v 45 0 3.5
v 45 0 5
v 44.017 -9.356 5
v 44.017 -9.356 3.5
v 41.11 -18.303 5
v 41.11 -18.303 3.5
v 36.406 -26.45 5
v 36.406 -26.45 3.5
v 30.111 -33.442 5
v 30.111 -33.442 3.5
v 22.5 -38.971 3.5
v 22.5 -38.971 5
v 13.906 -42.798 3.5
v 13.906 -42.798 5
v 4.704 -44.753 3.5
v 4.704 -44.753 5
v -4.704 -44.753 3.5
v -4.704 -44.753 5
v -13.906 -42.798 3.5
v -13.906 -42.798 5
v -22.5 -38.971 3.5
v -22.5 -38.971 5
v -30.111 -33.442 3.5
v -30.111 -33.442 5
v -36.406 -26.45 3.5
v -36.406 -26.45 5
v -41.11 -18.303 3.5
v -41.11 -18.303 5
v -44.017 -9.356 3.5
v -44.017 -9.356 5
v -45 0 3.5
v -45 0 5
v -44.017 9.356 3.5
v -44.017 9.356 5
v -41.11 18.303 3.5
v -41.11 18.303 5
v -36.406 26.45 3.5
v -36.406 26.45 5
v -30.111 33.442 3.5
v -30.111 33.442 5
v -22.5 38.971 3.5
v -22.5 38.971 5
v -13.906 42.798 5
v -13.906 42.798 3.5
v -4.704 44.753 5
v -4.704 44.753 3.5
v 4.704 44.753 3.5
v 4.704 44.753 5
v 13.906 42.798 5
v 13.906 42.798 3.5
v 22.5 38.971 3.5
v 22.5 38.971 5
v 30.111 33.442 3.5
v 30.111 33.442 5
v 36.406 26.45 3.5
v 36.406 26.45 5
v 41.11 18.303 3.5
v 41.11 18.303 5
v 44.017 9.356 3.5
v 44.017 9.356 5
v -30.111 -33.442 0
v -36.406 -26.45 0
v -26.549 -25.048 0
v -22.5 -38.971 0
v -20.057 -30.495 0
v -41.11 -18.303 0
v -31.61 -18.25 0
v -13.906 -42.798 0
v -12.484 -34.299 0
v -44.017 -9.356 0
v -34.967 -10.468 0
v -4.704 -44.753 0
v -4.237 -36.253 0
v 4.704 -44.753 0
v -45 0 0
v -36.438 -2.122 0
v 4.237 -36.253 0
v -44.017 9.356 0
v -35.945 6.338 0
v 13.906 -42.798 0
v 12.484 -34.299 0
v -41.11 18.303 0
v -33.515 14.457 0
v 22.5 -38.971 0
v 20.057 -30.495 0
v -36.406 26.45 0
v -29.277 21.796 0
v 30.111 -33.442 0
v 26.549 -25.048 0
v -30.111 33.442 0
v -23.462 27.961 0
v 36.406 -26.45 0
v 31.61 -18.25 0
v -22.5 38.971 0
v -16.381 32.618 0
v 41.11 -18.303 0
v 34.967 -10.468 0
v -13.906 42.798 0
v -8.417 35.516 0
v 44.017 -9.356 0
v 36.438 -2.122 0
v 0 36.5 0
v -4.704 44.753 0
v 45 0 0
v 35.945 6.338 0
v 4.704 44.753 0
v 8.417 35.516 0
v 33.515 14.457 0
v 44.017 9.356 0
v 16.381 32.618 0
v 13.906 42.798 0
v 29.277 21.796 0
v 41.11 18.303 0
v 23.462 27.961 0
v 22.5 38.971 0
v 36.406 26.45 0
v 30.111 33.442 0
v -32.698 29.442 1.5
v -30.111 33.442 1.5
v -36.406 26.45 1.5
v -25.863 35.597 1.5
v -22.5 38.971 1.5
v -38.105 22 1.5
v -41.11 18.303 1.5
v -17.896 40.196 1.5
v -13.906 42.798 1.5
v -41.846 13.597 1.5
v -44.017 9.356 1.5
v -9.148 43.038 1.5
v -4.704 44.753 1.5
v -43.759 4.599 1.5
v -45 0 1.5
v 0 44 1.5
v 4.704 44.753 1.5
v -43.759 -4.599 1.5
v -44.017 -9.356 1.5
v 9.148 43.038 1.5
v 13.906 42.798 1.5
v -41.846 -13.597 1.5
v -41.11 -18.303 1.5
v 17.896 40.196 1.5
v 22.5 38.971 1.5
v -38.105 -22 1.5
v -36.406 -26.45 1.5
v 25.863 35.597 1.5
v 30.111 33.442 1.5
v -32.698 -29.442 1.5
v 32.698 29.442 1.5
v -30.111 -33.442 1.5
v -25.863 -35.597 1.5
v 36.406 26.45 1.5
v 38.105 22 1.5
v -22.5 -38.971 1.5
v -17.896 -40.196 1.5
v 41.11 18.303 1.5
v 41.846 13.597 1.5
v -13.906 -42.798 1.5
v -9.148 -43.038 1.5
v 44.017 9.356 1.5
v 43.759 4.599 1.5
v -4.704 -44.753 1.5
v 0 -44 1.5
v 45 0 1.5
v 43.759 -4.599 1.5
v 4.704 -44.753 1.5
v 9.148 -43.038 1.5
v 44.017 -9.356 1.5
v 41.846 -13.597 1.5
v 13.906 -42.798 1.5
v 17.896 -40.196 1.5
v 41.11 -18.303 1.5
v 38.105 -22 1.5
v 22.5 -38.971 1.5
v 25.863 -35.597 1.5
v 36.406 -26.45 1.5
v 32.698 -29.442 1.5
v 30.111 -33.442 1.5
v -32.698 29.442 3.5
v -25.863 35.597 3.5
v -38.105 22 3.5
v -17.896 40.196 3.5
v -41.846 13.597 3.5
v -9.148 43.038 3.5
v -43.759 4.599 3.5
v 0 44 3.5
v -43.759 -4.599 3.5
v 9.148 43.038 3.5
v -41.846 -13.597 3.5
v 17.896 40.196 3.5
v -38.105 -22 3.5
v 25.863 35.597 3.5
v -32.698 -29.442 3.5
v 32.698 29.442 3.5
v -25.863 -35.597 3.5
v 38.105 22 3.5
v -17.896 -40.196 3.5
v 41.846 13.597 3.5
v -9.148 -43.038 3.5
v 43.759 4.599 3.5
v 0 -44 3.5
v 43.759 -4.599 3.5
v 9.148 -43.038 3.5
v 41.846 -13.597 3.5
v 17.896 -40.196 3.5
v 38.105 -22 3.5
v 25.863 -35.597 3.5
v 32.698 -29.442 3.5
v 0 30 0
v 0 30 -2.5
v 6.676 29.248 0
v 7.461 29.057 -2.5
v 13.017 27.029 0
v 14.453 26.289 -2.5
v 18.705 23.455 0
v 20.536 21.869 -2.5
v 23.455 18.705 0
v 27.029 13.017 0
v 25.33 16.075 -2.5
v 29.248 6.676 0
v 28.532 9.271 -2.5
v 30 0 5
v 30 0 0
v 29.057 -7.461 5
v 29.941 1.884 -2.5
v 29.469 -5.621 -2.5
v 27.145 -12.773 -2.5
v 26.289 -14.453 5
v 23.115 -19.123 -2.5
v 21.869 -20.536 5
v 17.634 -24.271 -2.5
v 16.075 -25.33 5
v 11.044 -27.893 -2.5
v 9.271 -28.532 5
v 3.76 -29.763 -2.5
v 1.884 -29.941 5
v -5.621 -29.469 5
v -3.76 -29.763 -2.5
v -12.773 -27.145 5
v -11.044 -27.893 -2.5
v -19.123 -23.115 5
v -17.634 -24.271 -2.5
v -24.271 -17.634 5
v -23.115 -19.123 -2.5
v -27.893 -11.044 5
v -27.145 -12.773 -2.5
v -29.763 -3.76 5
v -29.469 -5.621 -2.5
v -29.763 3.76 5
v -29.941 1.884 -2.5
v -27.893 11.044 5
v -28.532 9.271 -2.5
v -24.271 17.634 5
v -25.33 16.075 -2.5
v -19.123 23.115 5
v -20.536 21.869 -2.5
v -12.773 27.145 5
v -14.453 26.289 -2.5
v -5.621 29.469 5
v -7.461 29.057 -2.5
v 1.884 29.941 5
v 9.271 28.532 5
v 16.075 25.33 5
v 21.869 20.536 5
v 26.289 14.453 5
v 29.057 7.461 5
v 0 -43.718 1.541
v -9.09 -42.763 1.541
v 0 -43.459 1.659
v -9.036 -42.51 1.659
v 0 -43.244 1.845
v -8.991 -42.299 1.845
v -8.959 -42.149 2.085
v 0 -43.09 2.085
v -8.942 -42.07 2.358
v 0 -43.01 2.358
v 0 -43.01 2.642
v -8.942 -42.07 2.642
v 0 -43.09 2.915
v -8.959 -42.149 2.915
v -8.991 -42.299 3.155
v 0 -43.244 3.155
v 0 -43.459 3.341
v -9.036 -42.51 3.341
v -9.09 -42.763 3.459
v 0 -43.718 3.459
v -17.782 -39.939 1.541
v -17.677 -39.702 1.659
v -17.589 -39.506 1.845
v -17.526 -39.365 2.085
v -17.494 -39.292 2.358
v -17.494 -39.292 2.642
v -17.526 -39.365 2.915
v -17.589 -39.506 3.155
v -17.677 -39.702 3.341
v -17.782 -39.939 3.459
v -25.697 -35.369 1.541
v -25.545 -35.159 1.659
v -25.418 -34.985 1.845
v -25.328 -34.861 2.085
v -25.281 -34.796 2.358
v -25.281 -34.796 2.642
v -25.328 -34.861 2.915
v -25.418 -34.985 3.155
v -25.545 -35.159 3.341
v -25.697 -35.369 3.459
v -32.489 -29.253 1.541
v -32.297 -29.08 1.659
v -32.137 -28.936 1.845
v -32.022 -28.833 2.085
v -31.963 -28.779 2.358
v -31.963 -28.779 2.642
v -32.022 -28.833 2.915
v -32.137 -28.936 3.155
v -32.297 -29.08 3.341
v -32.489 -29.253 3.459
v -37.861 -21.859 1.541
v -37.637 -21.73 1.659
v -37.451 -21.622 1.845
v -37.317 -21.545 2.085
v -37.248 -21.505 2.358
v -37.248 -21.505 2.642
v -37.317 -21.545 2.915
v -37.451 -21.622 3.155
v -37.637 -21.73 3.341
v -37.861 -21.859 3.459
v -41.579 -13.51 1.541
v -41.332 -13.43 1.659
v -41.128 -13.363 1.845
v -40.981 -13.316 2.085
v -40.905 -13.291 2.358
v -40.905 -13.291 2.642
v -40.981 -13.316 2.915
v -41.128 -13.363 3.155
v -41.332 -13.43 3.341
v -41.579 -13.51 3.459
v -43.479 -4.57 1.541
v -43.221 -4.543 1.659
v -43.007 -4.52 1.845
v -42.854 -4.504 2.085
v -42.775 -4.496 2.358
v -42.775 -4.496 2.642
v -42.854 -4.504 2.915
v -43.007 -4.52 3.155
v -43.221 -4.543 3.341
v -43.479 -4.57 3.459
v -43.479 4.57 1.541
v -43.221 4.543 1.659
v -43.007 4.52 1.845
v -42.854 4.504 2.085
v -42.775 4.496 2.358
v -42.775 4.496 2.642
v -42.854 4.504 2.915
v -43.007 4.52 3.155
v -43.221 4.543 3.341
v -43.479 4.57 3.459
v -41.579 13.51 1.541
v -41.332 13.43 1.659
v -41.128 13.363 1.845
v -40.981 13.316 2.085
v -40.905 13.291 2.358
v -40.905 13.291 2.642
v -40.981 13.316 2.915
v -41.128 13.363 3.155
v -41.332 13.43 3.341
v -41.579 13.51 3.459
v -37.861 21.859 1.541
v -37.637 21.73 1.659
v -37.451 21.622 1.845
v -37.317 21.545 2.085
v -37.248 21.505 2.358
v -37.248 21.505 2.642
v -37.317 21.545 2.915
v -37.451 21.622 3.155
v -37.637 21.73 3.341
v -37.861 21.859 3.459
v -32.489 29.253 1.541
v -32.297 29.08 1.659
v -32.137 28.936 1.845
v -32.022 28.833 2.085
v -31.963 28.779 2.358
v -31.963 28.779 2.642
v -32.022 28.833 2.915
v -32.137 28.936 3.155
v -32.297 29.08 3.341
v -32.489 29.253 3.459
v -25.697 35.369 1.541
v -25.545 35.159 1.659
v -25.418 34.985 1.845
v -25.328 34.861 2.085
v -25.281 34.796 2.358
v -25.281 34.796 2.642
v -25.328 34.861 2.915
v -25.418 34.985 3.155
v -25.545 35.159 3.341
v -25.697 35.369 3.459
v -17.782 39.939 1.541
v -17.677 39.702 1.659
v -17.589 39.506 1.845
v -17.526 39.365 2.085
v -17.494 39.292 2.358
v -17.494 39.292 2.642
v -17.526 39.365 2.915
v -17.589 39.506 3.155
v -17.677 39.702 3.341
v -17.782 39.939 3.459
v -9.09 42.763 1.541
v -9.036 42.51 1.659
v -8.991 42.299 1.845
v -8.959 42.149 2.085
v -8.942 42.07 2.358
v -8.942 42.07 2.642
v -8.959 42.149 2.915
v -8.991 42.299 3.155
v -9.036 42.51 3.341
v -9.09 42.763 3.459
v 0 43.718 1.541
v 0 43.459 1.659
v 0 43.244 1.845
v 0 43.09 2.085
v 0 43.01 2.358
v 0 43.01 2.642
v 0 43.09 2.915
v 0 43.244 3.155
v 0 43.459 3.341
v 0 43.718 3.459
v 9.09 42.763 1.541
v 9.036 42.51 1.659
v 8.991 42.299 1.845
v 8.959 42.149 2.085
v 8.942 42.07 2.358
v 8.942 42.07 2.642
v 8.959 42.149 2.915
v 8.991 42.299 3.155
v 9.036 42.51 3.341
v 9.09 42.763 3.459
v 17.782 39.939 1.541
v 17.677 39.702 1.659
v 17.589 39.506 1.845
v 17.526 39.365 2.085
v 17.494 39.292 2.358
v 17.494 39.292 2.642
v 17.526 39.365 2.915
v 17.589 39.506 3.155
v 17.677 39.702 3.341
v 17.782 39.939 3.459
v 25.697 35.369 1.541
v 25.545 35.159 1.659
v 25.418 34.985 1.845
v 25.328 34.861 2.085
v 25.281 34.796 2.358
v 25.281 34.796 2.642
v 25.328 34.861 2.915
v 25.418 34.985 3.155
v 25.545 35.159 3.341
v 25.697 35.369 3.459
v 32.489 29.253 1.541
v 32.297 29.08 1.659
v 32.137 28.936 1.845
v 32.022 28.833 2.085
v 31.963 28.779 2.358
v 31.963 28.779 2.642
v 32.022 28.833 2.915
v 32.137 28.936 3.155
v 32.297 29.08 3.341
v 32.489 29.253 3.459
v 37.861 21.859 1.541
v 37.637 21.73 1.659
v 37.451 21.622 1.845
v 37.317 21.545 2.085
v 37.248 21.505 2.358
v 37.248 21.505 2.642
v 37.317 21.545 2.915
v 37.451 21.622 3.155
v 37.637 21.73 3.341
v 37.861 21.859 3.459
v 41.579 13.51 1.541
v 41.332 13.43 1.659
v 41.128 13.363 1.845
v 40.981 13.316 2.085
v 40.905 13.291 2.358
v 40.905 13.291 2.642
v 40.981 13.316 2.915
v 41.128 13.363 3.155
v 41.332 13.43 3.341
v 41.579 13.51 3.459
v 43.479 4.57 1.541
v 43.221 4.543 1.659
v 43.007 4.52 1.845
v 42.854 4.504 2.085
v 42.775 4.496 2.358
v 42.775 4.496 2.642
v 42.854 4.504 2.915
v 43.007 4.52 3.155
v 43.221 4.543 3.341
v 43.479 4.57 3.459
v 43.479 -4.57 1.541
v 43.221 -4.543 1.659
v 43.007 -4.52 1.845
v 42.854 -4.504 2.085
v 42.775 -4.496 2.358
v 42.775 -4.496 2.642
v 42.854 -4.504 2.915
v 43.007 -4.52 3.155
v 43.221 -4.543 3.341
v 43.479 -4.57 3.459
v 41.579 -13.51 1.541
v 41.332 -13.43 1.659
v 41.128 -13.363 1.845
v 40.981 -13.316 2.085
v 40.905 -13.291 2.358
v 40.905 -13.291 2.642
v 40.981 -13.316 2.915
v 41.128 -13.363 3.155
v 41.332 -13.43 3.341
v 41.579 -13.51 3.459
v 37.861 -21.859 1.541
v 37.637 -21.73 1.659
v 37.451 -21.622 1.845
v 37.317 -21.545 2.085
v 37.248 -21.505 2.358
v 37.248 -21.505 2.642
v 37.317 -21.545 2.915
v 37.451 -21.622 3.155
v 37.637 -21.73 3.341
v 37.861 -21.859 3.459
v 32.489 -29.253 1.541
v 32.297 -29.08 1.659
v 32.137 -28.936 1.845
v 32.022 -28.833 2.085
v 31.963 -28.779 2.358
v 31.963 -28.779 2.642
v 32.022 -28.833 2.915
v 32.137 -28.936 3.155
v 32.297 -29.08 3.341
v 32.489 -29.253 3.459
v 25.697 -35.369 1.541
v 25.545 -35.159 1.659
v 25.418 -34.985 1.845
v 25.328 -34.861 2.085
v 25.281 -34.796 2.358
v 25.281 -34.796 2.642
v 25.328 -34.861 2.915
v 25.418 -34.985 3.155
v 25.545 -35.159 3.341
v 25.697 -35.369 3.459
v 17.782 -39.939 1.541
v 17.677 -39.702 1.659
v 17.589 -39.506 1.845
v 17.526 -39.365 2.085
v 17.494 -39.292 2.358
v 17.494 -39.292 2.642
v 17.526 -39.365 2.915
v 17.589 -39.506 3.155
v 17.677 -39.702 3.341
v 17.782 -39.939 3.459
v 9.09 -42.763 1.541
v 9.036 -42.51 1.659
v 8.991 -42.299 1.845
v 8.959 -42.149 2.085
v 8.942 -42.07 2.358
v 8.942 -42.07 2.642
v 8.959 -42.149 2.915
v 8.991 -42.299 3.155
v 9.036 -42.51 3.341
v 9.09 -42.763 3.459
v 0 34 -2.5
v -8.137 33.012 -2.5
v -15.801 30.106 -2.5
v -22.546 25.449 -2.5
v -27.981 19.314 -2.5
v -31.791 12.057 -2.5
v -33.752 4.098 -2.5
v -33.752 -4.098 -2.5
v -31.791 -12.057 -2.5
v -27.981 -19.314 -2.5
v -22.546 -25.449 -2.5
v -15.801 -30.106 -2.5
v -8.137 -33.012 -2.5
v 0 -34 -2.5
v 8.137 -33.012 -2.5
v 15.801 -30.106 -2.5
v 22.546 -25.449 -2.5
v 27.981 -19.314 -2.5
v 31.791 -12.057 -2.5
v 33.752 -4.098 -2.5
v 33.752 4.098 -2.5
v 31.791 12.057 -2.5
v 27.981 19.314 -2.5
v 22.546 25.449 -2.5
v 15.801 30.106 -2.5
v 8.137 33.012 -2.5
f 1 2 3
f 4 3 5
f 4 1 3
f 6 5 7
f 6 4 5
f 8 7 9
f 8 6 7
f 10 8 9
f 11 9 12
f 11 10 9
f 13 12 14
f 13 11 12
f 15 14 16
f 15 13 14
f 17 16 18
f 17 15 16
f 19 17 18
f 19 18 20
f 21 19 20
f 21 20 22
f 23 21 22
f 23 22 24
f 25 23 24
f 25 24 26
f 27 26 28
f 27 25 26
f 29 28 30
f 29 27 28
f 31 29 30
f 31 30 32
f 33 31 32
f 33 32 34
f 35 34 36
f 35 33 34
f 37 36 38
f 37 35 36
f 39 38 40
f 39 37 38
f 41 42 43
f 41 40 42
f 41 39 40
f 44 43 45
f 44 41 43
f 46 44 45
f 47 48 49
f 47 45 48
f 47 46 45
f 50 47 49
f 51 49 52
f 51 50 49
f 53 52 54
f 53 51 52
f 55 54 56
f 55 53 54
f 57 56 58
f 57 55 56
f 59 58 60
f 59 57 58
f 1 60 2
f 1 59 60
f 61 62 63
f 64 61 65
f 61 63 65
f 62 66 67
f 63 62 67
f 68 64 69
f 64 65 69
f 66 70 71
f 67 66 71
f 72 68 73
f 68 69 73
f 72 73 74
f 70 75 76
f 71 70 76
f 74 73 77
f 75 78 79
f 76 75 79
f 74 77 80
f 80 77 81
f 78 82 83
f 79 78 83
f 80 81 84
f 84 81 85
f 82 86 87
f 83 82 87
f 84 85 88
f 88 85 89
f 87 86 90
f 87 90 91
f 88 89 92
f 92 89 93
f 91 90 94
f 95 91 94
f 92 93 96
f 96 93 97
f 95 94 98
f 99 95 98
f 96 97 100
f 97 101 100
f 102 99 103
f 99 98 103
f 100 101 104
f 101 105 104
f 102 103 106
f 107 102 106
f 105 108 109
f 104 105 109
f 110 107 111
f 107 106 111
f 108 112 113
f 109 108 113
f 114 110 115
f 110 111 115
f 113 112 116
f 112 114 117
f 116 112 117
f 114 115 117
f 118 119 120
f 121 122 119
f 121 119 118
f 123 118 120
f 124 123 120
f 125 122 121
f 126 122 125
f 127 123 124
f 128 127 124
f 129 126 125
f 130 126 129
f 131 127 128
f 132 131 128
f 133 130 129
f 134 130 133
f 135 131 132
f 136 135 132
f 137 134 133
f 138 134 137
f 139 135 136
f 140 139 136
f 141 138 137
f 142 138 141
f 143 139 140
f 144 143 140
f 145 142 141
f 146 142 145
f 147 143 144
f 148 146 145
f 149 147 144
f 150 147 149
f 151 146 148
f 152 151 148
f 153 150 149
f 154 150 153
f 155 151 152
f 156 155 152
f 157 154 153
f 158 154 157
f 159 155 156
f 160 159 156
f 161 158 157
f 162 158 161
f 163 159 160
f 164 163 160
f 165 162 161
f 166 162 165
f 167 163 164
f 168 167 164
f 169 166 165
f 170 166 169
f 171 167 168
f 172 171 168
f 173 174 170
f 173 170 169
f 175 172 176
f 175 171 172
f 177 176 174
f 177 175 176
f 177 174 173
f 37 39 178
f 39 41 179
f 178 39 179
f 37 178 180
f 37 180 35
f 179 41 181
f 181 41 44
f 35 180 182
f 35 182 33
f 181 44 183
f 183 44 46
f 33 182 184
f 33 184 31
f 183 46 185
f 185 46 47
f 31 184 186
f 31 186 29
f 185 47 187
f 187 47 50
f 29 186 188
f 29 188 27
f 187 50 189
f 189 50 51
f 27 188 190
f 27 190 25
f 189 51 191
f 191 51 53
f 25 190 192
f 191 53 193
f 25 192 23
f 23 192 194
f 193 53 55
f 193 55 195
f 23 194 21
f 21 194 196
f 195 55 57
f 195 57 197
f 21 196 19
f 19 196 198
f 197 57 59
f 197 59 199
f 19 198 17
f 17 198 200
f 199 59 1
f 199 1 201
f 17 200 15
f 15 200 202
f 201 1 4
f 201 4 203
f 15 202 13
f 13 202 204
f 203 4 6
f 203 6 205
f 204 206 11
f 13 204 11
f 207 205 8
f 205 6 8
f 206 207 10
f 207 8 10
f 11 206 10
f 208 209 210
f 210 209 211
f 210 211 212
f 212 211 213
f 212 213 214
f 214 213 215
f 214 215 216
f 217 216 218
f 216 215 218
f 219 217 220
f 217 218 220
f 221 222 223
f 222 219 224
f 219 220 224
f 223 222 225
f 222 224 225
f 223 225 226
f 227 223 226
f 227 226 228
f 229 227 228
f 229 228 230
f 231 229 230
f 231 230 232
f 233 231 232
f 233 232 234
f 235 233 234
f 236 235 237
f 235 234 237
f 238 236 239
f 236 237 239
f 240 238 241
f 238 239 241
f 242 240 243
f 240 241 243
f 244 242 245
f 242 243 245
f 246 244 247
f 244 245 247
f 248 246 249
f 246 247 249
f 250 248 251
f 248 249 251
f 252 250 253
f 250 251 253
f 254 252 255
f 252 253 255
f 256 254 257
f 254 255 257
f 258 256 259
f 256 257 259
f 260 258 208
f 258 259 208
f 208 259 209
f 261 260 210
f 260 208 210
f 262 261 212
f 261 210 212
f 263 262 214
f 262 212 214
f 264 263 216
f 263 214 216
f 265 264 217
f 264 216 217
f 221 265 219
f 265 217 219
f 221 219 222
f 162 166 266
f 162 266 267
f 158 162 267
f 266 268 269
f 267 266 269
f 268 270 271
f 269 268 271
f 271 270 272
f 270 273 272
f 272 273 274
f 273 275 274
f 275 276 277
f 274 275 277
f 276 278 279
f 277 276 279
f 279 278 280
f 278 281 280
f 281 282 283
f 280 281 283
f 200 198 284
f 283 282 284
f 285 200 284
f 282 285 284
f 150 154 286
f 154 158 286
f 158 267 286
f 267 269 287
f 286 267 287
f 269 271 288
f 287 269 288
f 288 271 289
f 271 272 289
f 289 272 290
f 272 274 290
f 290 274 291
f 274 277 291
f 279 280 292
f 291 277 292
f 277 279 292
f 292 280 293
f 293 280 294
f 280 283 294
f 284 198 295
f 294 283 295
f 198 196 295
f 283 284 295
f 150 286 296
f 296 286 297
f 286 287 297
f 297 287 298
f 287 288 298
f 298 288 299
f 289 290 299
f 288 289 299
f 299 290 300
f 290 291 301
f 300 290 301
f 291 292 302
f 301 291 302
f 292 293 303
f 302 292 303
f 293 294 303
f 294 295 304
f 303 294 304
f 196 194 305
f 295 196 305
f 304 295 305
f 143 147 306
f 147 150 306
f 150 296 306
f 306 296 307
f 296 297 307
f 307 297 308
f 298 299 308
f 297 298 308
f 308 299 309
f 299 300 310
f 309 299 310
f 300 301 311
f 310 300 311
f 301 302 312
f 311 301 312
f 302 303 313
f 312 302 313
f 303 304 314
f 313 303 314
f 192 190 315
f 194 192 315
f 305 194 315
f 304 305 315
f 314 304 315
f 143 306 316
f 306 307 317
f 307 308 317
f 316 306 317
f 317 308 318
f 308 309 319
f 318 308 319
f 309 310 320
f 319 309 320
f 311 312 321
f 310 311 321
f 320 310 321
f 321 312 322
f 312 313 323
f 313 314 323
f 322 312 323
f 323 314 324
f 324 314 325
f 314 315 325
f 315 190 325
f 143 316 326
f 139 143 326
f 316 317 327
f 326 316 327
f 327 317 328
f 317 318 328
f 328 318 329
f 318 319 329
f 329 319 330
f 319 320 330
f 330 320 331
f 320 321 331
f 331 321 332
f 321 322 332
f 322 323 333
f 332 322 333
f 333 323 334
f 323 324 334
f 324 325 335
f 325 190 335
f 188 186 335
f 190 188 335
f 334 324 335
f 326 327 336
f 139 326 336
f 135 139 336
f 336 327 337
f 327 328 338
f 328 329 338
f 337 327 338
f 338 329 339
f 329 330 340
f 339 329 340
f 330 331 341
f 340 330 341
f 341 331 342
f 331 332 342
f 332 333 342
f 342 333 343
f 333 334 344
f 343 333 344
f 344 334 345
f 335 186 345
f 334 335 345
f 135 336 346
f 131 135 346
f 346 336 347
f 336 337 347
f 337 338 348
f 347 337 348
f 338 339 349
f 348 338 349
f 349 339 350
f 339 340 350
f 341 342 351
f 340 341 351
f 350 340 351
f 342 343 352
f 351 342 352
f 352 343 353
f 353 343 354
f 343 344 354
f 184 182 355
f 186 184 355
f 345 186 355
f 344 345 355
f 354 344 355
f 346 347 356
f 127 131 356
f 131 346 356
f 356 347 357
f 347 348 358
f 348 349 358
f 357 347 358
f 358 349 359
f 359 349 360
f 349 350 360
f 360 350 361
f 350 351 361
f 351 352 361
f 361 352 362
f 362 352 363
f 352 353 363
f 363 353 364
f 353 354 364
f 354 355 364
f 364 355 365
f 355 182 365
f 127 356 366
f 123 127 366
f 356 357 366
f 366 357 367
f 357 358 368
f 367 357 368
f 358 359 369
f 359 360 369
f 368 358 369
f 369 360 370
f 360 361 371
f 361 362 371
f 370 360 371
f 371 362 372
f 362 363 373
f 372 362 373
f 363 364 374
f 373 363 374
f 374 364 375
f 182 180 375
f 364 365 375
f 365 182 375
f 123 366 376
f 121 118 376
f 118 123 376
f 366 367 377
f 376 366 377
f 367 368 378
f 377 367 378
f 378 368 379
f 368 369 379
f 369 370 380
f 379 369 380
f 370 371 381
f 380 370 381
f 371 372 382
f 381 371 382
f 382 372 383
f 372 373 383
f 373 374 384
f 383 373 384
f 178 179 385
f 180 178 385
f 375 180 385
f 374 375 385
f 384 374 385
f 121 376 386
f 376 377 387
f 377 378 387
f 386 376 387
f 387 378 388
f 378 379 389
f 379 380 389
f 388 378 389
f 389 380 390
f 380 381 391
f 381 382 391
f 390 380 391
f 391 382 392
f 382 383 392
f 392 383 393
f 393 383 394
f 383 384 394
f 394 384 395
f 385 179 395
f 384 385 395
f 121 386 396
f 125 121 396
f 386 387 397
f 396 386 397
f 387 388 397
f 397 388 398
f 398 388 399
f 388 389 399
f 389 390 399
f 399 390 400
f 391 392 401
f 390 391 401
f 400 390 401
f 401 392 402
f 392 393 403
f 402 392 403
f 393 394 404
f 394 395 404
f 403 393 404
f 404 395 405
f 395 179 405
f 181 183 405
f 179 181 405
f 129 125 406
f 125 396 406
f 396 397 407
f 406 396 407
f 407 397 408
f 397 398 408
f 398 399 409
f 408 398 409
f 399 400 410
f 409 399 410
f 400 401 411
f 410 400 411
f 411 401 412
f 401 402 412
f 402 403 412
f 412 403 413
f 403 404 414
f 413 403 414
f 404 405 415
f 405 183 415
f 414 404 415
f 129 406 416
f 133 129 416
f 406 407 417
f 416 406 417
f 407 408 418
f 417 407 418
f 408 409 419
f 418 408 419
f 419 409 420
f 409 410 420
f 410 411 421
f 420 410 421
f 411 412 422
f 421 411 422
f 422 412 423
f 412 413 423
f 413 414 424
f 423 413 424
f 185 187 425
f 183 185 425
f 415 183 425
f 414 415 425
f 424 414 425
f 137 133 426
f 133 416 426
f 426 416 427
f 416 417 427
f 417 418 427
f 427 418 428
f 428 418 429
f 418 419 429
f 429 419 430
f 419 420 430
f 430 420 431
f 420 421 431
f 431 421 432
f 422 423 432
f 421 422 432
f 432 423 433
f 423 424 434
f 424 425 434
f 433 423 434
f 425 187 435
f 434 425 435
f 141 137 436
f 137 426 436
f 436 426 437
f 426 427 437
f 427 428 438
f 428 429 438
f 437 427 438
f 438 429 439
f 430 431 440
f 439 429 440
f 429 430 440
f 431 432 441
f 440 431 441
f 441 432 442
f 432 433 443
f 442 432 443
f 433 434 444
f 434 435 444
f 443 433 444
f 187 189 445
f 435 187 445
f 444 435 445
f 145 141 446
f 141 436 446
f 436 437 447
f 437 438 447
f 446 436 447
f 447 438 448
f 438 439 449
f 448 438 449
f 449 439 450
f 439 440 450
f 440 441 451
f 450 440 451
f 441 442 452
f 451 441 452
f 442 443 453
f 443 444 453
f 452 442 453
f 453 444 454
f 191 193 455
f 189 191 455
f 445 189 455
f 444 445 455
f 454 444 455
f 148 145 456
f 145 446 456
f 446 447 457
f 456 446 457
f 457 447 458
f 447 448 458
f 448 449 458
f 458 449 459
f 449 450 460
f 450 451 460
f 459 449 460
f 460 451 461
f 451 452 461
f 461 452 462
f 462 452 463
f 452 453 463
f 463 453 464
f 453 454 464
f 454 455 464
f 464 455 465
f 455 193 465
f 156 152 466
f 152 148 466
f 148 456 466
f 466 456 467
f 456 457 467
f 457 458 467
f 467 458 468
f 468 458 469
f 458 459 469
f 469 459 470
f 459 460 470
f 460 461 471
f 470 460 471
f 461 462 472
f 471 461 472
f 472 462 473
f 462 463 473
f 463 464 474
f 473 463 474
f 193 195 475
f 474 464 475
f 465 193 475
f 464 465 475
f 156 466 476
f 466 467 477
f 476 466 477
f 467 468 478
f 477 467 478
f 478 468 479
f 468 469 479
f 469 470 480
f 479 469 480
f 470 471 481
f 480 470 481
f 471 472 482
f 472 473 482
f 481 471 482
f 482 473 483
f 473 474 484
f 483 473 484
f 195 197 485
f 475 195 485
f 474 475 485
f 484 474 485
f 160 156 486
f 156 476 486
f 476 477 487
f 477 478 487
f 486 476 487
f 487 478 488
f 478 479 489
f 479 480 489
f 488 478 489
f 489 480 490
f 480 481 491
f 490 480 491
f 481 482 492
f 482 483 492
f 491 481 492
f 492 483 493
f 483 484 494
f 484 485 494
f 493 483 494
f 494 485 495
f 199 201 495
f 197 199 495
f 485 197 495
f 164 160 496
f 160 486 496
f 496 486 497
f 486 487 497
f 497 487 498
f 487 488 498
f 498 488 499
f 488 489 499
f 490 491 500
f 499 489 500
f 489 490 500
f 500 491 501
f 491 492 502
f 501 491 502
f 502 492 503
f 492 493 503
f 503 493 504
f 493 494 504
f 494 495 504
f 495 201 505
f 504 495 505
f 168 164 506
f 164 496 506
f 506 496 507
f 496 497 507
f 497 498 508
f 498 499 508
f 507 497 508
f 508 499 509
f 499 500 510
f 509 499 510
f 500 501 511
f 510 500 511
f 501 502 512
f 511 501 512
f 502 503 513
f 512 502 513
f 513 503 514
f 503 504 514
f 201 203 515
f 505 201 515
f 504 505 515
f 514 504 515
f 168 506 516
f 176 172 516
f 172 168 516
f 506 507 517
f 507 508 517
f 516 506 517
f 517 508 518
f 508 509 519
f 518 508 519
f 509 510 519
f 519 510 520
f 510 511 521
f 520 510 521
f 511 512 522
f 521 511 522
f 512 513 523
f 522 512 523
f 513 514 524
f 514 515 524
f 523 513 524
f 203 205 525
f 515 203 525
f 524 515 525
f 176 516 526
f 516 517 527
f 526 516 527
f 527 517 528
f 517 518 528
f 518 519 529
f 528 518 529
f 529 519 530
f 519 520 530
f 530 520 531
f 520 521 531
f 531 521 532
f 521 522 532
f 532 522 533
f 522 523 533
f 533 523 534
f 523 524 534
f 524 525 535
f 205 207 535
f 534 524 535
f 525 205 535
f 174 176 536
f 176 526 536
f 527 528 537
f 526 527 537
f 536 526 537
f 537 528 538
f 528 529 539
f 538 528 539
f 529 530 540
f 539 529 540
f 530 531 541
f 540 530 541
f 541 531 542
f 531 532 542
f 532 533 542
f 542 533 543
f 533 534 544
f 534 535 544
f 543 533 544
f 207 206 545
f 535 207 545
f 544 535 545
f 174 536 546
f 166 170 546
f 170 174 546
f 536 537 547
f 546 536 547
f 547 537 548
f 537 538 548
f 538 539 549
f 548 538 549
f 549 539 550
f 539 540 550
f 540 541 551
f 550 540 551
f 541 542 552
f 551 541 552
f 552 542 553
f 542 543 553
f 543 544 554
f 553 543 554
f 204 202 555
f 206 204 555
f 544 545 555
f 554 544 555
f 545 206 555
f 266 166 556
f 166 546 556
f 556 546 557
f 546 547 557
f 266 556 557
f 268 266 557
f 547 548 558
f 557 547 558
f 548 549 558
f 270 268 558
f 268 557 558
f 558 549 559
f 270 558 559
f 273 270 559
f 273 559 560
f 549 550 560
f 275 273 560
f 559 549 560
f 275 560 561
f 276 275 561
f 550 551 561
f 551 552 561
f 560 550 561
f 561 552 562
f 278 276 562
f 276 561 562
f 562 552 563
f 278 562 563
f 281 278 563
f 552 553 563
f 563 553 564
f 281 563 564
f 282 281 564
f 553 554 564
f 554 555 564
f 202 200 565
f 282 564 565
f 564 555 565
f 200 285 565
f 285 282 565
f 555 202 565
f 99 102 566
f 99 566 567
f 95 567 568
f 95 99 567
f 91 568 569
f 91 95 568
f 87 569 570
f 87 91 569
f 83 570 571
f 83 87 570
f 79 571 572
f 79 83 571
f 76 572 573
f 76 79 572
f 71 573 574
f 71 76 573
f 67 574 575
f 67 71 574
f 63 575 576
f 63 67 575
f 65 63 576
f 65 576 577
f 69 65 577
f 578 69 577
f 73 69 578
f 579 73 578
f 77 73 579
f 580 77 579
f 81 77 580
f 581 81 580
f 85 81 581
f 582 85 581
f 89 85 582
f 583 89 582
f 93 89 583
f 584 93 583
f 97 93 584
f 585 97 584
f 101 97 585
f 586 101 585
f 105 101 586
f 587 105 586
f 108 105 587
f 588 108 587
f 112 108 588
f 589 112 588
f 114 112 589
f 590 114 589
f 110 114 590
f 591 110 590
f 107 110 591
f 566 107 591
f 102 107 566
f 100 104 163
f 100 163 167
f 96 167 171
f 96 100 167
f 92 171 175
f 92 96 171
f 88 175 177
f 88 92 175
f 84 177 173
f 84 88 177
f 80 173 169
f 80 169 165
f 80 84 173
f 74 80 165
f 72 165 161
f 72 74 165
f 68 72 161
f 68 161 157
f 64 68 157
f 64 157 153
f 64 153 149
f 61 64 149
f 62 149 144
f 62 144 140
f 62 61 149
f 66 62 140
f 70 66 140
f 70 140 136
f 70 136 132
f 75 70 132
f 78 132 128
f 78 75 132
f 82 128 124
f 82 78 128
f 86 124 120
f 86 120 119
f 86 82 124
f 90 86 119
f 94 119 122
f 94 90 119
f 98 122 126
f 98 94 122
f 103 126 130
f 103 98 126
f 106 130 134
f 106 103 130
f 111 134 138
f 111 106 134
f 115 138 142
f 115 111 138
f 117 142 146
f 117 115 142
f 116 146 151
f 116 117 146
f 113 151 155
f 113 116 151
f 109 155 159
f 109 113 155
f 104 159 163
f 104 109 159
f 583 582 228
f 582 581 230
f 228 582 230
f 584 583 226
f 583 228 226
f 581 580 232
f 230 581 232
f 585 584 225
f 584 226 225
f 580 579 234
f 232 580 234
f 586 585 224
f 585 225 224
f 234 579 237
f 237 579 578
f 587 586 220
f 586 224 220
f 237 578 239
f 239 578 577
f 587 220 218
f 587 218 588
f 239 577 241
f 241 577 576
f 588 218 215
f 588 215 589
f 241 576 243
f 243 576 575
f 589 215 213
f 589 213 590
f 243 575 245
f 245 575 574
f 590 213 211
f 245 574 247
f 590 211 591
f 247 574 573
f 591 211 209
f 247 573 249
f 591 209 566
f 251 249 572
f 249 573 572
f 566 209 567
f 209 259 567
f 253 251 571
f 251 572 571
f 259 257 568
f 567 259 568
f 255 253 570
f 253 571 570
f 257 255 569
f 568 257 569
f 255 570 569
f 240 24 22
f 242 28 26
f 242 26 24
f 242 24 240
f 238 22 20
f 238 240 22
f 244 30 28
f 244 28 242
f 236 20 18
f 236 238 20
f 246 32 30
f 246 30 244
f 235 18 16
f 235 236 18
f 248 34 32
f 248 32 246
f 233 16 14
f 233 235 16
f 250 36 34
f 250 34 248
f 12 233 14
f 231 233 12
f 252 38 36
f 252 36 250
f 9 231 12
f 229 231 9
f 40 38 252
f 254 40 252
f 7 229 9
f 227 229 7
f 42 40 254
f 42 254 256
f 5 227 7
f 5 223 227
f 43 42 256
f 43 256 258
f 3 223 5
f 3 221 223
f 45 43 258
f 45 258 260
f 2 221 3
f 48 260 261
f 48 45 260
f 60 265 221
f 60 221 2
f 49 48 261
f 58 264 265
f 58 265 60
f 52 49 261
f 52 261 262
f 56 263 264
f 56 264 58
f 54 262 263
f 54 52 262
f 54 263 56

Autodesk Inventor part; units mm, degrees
ref_plane "YZ Plane" through (0, 0, 0) normal (1, 0, 0) x (0, 1, 0)
ref_plane "XZ Plane" through (0, 0, 0) normal (0, 1, 0) x (-1, 0, 0)
ref_plane "XY Plane" through (0, 0, 0) normal (0, 0, 1) x (1, 0, 0)
sketch "Эскиз1" plane through (0, 0, 0) normal (0, 0, 1) x (1, 0, 0)
  circle A0 centre (0, 0) radius 30
  circle A1 centre (0, 0) radius 45
  dimension "d0" = 60
  dimension "d1" = 90
extrude "Выдавливание1" add sketch "Эскиз1" along normal blind 5
sketch "Эскиз2" plane through (0, 0, 0) normal (1, 0, 0) x (0, 1, 0)
  line L0 (-45, 0) -> (-45, 5) projected
  line L1 (0, -0.8) -> (0, 4.8) projected
  line L2 (-45, 0) -> (-45, 5) projected
  line L3 (-45, 2.5) -> (-44, 2.5)
  circle A0 centre (-44, 2.5) radius 1
  line L4 (-44, 3.5) -> (-45, 3.5)
  line L5 (-44, 1.5) -> (-45, 1.5)
  line L6 (-45, 0) -> (-45, 5) projected
  point P0 (0, 0)
  dimension "d6" = 1
  dimension "d7" = 2
revolve "Вращение1" cut sketch "Эскиз2" angle 360 about axis through (0, 0, -10) along (0, 0, 1)
sketch "Эскиз3" plane through (0, 0, 0) normal (1, 0, 0) x (0, 1, 0)
  line L0 (45, 0) -> (-45, 0) projected
  line L1 (30, 0) -> (30, -2.5)
  line L2 (30, -2.5) -> (34, -2.5)
  line L3 (34, -2.5) -> (36.5, 0)
  line L4 (0, -4) -> (0, 6.5) projected
  point P0 (0, 0)
  dimension "d9" = 2.5
  dimension "d10" = 4
  dimension "d11" = 135
revolve "Вращение2" add sketch "Эскиз3" angle 360 about axis through (0, 0, -10) along (0, 0, 1)
properties part number "Кольцо сальника 1" material "Сталь, легированная"
